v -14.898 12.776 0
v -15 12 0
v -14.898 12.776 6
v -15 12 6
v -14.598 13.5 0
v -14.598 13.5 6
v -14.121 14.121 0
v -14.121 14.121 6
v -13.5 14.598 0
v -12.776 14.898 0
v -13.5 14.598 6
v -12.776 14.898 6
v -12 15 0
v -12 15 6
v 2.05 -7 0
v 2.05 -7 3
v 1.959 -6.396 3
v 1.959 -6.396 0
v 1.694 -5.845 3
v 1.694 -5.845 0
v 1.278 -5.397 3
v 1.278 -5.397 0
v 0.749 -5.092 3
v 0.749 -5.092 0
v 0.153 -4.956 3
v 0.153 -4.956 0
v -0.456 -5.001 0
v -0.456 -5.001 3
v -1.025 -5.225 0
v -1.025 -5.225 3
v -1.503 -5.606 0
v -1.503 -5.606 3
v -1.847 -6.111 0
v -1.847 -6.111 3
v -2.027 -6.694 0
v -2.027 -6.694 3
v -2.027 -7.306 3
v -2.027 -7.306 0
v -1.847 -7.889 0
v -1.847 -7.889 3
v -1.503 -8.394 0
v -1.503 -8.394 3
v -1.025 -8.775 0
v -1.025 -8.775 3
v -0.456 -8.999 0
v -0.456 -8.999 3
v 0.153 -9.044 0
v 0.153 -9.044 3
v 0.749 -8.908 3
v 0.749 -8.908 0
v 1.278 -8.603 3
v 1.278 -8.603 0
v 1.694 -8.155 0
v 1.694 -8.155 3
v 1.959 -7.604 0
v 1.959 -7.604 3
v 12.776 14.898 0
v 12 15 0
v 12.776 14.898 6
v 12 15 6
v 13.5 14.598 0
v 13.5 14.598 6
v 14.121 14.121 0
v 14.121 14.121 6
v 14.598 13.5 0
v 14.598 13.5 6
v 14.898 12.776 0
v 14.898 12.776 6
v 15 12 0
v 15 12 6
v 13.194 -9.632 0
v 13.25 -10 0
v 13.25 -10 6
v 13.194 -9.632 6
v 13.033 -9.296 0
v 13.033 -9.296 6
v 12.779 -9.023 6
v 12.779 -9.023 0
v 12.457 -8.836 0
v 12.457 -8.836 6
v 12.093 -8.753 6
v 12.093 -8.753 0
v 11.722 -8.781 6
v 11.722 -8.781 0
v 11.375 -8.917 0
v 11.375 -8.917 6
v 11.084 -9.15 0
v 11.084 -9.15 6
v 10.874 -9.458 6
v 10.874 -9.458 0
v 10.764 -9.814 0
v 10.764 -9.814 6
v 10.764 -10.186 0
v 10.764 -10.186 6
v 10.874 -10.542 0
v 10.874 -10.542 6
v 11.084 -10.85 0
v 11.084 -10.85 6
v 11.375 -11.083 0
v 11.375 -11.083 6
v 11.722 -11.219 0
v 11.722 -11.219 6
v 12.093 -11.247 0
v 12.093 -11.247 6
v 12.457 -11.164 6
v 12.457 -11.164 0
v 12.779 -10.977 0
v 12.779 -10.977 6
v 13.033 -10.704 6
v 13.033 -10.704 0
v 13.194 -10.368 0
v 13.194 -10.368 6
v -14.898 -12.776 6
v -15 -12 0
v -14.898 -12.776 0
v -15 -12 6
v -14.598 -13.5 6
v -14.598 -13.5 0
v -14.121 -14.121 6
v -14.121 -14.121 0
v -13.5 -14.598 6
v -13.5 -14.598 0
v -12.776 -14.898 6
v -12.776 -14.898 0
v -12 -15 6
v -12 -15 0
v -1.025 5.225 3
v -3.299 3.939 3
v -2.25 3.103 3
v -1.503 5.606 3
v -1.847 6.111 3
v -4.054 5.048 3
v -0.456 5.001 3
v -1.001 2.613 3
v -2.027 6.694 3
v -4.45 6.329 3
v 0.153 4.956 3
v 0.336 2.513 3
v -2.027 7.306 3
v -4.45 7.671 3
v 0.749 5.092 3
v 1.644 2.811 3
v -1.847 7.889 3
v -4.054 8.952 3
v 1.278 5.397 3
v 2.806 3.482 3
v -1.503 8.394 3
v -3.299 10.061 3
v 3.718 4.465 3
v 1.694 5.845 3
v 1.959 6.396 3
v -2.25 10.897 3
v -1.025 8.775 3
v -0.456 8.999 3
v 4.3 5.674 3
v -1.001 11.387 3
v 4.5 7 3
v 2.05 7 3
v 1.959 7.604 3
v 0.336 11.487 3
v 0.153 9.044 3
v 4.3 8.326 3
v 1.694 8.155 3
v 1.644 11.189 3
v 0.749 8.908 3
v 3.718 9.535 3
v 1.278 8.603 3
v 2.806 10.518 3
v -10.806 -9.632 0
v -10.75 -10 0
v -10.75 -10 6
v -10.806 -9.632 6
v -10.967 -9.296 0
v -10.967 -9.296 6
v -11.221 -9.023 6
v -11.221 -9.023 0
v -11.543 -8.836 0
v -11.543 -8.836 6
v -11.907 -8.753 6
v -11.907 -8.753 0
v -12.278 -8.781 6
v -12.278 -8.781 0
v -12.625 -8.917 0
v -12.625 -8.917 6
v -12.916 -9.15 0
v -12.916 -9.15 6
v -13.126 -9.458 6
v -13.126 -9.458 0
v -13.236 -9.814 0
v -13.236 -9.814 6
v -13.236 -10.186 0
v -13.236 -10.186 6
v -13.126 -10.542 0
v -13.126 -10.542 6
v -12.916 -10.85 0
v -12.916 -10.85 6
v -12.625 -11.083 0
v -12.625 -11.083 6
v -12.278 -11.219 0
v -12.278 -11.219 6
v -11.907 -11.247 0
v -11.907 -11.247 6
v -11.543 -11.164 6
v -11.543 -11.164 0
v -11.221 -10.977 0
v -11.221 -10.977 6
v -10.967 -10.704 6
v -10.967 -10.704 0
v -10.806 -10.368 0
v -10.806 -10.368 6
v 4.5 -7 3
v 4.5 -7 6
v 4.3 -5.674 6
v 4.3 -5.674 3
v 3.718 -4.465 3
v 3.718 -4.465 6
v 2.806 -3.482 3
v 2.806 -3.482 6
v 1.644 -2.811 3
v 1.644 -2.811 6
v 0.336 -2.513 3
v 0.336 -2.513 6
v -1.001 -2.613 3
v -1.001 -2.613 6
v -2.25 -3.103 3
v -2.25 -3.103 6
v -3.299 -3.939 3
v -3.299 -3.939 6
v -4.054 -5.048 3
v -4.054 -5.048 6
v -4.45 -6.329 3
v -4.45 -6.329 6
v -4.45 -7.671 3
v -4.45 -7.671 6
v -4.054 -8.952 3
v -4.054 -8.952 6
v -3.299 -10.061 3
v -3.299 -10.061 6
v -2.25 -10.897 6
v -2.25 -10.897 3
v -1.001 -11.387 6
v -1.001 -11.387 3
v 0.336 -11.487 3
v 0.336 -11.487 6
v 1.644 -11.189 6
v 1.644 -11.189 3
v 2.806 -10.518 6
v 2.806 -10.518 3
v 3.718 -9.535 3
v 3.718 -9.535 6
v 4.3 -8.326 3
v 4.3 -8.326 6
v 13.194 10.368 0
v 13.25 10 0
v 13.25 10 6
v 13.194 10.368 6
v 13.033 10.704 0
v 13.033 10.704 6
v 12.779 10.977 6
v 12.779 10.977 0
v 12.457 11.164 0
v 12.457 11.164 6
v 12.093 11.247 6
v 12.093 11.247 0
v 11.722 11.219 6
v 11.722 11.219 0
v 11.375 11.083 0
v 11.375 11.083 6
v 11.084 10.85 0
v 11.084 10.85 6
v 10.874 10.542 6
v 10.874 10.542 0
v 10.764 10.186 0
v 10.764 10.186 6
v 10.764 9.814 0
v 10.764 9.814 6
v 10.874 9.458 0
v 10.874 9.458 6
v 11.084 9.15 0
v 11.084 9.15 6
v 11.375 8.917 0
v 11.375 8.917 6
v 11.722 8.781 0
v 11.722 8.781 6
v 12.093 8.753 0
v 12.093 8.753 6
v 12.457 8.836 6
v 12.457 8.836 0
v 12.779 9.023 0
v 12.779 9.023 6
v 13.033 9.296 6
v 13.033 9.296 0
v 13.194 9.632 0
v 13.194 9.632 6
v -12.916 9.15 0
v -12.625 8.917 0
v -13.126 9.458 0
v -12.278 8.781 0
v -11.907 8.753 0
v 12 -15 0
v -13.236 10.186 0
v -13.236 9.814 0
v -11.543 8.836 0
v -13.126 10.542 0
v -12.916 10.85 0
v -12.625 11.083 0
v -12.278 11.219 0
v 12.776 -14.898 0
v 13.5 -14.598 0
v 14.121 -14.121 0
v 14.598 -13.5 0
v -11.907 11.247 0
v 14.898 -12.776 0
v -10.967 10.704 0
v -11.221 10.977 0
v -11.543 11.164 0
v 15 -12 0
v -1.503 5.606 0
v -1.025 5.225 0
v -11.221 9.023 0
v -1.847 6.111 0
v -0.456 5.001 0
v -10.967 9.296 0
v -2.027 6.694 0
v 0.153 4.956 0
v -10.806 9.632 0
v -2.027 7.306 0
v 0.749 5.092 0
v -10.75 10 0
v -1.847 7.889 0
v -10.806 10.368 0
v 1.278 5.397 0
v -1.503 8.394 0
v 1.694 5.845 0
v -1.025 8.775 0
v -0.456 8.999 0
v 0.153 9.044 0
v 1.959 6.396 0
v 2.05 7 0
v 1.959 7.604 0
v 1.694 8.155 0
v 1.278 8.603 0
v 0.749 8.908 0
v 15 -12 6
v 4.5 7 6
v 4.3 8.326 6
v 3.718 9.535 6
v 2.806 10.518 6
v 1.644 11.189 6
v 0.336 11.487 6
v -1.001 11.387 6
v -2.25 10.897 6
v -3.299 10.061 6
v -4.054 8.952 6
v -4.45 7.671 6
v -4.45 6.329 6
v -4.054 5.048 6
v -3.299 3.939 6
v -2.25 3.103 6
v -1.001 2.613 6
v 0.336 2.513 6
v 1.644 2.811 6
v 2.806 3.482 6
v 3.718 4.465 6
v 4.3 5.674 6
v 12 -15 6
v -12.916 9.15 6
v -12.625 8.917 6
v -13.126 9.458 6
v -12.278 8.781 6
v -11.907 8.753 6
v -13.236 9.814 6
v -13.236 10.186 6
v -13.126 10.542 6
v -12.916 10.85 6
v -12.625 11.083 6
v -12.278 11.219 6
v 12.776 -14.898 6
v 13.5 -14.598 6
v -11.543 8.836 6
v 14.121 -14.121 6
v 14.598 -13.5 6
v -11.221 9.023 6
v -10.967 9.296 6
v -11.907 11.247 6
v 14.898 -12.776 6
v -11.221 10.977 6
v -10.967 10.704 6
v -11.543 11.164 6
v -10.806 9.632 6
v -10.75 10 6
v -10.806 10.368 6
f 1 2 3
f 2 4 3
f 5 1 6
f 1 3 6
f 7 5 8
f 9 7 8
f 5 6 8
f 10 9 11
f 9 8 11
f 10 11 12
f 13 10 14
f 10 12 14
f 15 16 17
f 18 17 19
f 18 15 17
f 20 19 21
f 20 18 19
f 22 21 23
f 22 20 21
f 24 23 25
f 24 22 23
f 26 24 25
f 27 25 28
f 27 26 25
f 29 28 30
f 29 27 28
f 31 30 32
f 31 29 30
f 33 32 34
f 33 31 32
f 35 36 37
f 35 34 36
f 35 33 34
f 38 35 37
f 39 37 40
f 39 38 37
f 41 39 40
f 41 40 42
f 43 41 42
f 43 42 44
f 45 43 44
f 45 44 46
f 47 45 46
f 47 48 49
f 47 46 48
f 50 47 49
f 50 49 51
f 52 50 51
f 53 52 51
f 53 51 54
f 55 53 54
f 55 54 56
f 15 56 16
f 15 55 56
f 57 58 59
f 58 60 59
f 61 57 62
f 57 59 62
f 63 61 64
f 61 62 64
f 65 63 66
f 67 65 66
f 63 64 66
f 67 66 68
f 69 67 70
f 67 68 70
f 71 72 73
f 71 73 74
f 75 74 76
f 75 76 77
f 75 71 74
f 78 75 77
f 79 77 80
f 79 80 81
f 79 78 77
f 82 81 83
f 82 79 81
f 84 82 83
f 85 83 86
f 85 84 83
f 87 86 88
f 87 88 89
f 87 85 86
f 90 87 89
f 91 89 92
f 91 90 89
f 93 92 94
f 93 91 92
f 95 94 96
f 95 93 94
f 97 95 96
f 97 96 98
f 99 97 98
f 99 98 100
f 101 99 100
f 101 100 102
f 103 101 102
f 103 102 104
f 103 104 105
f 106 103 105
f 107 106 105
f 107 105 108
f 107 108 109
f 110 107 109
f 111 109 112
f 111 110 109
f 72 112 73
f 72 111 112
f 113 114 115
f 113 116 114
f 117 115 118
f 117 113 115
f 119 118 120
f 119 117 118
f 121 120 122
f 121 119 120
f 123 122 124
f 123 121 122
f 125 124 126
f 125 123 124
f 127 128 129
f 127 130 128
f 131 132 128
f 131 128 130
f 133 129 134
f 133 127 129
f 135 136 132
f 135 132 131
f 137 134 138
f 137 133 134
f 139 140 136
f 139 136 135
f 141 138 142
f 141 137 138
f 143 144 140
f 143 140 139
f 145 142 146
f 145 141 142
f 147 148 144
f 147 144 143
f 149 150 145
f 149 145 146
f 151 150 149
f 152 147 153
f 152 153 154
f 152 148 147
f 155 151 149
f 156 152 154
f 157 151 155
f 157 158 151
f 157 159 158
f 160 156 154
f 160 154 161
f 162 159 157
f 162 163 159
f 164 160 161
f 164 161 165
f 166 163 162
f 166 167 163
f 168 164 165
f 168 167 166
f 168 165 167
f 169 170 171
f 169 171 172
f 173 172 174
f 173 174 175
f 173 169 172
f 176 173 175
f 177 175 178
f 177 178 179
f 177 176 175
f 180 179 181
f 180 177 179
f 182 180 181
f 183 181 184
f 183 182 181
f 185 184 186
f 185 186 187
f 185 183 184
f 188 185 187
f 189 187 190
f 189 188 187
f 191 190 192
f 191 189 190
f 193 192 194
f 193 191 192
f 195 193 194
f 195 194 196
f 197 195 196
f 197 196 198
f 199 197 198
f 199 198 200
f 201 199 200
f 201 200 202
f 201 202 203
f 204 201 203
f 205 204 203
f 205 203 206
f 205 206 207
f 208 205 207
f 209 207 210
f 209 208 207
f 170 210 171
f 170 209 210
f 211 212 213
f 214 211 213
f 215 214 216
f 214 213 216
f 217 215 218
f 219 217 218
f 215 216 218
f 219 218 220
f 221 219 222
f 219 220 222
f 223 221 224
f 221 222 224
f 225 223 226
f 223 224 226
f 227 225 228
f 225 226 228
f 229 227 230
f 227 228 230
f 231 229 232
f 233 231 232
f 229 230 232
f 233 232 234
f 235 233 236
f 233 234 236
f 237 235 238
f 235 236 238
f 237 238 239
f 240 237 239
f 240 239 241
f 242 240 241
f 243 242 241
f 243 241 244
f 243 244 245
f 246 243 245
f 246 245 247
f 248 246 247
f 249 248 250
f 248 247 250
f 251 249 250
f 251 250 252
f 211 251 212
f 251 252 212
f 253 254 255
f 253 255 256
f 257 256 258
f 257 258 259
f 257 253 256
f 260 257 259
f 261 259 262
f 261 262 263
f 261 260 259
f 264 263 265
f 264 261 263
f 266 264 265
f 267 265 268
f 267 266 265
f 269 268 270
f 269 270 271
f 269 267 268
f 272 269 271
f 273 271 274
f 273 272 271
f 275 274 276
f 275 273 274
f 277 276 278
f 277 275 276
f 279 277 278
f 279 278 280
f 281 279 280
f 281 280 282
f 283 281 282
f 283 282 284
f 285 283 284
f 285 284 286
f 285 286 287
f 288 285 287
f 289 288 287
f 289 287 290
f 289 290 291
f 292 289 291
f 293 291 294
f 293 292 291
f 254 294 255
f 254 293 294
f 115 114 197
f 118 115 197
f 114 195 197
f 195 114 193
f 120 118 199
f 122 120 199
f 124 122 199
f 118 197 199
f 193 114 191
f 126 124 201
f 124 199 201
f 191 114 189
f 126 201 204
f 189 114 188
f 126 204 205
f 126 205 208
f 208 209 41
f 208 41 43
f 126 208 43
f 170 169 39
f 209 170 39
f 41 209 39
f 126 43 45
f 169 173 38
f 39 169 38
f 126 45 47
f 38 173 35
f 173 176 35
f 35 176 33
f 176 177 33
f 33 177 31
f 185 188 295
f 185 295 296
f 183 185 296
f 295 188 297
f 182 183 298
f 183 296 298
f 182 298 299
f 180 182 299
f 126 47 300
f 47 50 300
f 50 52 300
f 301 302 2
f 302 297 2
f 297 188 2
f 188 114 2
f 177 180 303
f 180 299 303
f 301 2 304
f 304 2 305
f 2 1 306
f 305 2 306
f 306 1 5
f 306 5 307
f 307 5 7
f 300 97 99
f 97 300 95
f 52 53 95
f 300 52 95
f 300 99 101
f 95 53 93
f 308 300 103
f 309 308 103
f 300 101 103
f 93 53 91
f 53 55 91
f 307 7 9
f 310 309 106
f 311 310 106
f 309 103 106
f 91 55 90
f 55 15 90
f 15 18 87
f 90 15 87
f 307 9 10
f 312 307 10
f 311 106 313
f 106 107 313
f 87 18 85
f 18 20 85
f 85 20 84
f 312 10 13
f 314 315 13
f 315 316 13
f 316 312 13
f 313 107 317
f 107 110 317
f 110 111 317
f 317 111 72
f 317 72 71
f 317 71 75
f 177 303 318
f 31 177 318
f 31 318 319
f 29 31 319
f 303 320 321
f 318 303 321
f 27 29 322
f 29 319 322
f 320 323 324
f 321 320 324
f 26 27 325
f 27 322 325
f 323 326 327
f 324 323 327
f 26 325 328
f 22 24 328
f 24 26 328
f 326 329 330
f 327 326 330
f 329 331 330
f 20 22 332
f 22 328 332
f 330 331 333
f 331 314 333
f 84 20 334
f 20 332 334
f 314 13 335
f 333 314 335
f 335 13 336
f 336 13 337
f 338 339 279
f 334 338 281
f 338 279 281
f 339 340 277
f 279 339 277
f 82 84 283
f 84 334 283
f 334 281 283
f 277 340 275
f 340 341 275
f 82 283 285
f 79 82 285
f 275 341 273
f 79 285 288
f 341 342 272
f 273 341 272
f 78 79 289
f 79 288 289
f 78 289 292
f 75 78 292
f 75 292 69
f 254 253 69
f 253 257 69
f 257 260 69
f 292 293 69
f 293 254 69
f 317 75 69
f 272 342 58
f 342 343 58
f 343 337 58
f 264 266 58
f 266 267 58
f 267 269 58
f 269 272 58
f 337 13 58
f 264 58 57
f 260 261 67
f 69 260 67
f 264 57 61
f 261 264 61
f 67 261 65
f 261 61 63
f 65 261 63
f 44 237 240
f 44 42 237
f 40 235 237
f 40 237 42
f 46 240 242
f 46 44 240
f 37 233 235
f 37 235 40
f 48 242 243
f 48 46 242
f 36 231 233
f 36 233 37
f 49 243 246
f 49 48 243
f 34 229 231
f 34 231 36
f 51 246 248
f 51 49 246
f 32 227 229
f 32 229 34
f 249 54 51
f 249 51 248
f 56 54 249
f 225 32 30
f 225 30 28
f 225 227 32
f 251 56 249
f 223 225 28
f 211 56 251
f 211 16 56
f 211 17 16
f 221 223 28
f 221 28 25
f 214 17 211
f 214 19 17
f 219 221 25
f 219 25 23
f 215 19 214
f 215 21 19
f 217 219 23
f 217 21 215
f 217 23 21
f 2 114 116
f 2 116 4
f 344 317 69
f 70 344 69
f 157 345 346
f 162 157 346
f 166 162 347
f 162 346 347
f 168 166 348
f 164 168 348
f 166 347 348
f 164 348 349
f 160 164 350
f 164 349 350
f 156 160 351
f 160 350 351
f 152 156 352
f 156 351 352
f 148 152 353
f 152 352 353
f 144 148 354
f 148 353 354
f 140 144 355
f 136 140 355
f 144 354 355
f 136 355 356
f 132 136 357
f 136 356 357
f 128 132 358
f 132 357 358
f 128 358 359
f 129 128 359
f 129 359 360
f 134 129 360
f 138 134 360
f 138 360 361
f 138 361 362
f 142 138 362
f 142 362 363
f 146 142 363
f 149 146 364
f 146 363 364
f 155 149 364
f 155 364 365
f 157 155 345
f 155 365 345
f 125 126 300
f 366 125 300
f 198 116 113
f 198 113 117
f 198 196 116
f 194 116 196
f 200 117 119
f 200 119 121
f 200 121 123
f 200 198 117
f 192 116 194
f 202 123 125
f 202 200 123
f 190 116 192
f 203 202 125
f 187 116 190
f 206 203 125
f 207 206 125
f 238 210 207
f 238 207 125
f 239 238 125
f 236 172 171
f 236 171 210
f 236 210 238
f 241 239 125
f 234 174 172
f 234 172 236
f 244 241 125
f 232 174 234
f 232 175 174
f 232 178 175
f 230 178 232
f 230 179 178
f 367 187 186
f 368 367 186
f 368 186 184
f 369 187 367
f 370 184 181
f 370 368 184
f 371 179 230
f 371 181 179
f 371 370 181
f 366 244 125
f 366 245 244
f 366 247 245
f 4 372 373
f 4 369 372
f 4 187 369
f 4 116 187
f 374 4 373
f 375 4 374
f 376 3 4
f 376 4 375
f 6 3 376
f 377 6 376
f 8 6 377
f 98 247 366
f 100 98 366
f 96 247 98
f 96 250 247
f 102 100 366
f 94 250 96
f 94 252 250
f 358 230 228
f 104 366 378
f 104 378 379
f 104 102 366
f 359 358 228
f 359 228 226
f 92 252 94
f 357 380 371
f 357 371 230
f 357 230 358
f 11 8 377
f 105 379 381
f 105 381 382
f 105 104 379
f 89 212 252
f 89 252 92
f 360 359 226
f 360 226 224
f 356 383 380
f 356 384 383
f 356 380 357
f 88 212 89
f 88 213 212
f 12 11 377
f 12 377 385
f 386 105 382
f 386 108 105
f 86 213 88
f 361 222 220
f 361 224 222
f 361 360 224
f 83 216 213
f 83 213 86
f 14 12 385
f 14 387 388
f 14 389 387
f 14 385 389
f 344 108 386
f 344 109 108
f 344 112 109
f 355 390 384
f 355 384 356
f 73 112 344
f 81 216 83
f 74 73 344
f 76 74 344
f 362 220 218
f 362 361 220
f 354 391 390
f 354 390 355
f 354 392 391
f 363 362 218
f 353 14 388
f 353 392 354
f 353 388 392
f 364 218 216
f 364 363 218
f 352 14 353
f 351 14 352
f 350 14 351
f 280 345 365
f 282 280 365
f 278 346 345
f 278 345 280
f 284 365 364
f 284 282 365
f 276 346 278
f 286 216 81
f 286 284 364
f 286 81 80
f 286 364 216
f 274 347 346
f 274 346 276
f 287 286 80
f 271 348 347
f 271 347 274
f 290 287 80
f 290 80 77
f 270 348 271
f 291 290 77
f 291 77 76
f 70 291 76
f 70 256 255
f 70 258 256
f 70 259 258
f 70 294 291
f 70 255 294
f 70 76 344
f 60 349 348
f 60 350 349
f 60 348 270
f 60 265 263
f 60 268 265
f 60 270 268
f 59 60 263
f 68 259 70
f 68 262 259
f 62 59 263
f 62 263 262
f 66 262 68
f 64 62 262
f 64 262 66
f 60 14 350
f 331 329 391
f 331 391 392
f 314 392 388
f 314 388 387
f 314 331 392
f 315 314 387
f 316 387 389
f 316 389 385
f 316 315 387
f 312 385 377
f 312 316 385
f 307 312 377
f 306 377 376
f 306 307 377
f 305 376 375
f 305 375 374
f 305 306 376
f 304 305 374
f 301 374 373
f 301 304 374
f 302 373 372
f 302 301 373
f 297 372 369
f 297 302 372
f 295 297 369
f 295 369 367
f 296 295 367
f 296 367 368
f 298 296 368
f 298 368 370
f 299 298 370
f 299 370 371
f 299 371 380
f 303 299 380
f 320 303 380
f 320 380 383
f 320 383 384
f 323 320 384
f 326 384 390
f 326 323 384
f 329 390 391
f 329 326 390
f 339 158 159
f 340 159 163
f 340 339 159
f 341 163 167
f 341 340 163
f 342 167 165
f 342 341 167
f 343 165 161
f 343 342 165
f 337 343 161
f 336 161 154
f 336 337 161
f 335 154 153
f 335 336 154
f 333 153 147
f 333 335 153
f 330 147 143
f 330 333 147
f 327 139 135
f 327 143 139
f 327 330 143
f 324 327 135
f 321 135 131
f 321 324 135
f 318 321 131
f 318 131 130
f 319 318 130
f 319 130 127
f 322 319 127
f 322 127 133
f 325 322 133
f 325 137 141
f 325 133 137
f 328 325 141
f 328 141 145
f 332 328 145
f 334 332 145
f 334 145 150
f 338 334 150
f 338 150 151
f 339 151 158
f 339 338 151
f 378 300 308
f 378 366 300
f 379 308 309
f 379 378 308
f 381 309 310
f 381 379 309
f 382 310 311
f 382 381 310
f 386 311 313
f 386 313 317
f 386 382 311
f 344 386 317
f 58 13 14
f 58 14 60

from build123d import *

# Parameters (mm, degrees)
F0_W     = 30
F0_H     = 30
F0_R     = 1.25
F0_R_2   = 2.05
F1_DEPTH = 6
F2_R     = 4.5
F3_DEPTH = 3
F4_R     = 3


with BuildPart() as f1:
    # F0 (on Top) → F1 (new body)
    with BuildSketch(Plane.XY):
        Rectangle(F0_W, F0_H)
        with Locations((-12, -10)):
            Circle(F0_R, mode=Mode.SUBTRACT)
        with Locations((12, -10)):
            Circle(F0_R, mode=Mode.SUBTRACT)
        with Locations((0, -7)):
            Circle(F0_R_2, mode=Mode.SUBTRACT)
        with Locations((-12, 10)):
            Circle(F0_R, mode=Mode.SUBTRACT)
        with Locations((0, 7)):
            Circle(F0_R_2, mode=Mode.SUBTRACT)
        with Locations((12, 10)):
            Circle(F0_R, mode=Mode.SUBTRACT)
    extrude(amount=F1_DEPTH)

    # F2 (on face) → F3 (cut)
    with BuildSketch(Plane.XY.offset(6)):
        with Locations((0, 7)):
            Circle(F2_R)
        with Locations((0, -7)):
            Circle(F2_R)
    extrude(amount=-F3_DEPTH, mode=Mode.SUBTRACT)

    # F4
    f4_edges = [f1.edges().sort_by_distance(p)[0] for p in [
        (15, -15, 3),
        (15, 15, 3),
        (-15, -15, 3),
        (-15, 15, 3),
    ]]
    fillet(f4_edges, radius=F4_R)


solid = f1.part
